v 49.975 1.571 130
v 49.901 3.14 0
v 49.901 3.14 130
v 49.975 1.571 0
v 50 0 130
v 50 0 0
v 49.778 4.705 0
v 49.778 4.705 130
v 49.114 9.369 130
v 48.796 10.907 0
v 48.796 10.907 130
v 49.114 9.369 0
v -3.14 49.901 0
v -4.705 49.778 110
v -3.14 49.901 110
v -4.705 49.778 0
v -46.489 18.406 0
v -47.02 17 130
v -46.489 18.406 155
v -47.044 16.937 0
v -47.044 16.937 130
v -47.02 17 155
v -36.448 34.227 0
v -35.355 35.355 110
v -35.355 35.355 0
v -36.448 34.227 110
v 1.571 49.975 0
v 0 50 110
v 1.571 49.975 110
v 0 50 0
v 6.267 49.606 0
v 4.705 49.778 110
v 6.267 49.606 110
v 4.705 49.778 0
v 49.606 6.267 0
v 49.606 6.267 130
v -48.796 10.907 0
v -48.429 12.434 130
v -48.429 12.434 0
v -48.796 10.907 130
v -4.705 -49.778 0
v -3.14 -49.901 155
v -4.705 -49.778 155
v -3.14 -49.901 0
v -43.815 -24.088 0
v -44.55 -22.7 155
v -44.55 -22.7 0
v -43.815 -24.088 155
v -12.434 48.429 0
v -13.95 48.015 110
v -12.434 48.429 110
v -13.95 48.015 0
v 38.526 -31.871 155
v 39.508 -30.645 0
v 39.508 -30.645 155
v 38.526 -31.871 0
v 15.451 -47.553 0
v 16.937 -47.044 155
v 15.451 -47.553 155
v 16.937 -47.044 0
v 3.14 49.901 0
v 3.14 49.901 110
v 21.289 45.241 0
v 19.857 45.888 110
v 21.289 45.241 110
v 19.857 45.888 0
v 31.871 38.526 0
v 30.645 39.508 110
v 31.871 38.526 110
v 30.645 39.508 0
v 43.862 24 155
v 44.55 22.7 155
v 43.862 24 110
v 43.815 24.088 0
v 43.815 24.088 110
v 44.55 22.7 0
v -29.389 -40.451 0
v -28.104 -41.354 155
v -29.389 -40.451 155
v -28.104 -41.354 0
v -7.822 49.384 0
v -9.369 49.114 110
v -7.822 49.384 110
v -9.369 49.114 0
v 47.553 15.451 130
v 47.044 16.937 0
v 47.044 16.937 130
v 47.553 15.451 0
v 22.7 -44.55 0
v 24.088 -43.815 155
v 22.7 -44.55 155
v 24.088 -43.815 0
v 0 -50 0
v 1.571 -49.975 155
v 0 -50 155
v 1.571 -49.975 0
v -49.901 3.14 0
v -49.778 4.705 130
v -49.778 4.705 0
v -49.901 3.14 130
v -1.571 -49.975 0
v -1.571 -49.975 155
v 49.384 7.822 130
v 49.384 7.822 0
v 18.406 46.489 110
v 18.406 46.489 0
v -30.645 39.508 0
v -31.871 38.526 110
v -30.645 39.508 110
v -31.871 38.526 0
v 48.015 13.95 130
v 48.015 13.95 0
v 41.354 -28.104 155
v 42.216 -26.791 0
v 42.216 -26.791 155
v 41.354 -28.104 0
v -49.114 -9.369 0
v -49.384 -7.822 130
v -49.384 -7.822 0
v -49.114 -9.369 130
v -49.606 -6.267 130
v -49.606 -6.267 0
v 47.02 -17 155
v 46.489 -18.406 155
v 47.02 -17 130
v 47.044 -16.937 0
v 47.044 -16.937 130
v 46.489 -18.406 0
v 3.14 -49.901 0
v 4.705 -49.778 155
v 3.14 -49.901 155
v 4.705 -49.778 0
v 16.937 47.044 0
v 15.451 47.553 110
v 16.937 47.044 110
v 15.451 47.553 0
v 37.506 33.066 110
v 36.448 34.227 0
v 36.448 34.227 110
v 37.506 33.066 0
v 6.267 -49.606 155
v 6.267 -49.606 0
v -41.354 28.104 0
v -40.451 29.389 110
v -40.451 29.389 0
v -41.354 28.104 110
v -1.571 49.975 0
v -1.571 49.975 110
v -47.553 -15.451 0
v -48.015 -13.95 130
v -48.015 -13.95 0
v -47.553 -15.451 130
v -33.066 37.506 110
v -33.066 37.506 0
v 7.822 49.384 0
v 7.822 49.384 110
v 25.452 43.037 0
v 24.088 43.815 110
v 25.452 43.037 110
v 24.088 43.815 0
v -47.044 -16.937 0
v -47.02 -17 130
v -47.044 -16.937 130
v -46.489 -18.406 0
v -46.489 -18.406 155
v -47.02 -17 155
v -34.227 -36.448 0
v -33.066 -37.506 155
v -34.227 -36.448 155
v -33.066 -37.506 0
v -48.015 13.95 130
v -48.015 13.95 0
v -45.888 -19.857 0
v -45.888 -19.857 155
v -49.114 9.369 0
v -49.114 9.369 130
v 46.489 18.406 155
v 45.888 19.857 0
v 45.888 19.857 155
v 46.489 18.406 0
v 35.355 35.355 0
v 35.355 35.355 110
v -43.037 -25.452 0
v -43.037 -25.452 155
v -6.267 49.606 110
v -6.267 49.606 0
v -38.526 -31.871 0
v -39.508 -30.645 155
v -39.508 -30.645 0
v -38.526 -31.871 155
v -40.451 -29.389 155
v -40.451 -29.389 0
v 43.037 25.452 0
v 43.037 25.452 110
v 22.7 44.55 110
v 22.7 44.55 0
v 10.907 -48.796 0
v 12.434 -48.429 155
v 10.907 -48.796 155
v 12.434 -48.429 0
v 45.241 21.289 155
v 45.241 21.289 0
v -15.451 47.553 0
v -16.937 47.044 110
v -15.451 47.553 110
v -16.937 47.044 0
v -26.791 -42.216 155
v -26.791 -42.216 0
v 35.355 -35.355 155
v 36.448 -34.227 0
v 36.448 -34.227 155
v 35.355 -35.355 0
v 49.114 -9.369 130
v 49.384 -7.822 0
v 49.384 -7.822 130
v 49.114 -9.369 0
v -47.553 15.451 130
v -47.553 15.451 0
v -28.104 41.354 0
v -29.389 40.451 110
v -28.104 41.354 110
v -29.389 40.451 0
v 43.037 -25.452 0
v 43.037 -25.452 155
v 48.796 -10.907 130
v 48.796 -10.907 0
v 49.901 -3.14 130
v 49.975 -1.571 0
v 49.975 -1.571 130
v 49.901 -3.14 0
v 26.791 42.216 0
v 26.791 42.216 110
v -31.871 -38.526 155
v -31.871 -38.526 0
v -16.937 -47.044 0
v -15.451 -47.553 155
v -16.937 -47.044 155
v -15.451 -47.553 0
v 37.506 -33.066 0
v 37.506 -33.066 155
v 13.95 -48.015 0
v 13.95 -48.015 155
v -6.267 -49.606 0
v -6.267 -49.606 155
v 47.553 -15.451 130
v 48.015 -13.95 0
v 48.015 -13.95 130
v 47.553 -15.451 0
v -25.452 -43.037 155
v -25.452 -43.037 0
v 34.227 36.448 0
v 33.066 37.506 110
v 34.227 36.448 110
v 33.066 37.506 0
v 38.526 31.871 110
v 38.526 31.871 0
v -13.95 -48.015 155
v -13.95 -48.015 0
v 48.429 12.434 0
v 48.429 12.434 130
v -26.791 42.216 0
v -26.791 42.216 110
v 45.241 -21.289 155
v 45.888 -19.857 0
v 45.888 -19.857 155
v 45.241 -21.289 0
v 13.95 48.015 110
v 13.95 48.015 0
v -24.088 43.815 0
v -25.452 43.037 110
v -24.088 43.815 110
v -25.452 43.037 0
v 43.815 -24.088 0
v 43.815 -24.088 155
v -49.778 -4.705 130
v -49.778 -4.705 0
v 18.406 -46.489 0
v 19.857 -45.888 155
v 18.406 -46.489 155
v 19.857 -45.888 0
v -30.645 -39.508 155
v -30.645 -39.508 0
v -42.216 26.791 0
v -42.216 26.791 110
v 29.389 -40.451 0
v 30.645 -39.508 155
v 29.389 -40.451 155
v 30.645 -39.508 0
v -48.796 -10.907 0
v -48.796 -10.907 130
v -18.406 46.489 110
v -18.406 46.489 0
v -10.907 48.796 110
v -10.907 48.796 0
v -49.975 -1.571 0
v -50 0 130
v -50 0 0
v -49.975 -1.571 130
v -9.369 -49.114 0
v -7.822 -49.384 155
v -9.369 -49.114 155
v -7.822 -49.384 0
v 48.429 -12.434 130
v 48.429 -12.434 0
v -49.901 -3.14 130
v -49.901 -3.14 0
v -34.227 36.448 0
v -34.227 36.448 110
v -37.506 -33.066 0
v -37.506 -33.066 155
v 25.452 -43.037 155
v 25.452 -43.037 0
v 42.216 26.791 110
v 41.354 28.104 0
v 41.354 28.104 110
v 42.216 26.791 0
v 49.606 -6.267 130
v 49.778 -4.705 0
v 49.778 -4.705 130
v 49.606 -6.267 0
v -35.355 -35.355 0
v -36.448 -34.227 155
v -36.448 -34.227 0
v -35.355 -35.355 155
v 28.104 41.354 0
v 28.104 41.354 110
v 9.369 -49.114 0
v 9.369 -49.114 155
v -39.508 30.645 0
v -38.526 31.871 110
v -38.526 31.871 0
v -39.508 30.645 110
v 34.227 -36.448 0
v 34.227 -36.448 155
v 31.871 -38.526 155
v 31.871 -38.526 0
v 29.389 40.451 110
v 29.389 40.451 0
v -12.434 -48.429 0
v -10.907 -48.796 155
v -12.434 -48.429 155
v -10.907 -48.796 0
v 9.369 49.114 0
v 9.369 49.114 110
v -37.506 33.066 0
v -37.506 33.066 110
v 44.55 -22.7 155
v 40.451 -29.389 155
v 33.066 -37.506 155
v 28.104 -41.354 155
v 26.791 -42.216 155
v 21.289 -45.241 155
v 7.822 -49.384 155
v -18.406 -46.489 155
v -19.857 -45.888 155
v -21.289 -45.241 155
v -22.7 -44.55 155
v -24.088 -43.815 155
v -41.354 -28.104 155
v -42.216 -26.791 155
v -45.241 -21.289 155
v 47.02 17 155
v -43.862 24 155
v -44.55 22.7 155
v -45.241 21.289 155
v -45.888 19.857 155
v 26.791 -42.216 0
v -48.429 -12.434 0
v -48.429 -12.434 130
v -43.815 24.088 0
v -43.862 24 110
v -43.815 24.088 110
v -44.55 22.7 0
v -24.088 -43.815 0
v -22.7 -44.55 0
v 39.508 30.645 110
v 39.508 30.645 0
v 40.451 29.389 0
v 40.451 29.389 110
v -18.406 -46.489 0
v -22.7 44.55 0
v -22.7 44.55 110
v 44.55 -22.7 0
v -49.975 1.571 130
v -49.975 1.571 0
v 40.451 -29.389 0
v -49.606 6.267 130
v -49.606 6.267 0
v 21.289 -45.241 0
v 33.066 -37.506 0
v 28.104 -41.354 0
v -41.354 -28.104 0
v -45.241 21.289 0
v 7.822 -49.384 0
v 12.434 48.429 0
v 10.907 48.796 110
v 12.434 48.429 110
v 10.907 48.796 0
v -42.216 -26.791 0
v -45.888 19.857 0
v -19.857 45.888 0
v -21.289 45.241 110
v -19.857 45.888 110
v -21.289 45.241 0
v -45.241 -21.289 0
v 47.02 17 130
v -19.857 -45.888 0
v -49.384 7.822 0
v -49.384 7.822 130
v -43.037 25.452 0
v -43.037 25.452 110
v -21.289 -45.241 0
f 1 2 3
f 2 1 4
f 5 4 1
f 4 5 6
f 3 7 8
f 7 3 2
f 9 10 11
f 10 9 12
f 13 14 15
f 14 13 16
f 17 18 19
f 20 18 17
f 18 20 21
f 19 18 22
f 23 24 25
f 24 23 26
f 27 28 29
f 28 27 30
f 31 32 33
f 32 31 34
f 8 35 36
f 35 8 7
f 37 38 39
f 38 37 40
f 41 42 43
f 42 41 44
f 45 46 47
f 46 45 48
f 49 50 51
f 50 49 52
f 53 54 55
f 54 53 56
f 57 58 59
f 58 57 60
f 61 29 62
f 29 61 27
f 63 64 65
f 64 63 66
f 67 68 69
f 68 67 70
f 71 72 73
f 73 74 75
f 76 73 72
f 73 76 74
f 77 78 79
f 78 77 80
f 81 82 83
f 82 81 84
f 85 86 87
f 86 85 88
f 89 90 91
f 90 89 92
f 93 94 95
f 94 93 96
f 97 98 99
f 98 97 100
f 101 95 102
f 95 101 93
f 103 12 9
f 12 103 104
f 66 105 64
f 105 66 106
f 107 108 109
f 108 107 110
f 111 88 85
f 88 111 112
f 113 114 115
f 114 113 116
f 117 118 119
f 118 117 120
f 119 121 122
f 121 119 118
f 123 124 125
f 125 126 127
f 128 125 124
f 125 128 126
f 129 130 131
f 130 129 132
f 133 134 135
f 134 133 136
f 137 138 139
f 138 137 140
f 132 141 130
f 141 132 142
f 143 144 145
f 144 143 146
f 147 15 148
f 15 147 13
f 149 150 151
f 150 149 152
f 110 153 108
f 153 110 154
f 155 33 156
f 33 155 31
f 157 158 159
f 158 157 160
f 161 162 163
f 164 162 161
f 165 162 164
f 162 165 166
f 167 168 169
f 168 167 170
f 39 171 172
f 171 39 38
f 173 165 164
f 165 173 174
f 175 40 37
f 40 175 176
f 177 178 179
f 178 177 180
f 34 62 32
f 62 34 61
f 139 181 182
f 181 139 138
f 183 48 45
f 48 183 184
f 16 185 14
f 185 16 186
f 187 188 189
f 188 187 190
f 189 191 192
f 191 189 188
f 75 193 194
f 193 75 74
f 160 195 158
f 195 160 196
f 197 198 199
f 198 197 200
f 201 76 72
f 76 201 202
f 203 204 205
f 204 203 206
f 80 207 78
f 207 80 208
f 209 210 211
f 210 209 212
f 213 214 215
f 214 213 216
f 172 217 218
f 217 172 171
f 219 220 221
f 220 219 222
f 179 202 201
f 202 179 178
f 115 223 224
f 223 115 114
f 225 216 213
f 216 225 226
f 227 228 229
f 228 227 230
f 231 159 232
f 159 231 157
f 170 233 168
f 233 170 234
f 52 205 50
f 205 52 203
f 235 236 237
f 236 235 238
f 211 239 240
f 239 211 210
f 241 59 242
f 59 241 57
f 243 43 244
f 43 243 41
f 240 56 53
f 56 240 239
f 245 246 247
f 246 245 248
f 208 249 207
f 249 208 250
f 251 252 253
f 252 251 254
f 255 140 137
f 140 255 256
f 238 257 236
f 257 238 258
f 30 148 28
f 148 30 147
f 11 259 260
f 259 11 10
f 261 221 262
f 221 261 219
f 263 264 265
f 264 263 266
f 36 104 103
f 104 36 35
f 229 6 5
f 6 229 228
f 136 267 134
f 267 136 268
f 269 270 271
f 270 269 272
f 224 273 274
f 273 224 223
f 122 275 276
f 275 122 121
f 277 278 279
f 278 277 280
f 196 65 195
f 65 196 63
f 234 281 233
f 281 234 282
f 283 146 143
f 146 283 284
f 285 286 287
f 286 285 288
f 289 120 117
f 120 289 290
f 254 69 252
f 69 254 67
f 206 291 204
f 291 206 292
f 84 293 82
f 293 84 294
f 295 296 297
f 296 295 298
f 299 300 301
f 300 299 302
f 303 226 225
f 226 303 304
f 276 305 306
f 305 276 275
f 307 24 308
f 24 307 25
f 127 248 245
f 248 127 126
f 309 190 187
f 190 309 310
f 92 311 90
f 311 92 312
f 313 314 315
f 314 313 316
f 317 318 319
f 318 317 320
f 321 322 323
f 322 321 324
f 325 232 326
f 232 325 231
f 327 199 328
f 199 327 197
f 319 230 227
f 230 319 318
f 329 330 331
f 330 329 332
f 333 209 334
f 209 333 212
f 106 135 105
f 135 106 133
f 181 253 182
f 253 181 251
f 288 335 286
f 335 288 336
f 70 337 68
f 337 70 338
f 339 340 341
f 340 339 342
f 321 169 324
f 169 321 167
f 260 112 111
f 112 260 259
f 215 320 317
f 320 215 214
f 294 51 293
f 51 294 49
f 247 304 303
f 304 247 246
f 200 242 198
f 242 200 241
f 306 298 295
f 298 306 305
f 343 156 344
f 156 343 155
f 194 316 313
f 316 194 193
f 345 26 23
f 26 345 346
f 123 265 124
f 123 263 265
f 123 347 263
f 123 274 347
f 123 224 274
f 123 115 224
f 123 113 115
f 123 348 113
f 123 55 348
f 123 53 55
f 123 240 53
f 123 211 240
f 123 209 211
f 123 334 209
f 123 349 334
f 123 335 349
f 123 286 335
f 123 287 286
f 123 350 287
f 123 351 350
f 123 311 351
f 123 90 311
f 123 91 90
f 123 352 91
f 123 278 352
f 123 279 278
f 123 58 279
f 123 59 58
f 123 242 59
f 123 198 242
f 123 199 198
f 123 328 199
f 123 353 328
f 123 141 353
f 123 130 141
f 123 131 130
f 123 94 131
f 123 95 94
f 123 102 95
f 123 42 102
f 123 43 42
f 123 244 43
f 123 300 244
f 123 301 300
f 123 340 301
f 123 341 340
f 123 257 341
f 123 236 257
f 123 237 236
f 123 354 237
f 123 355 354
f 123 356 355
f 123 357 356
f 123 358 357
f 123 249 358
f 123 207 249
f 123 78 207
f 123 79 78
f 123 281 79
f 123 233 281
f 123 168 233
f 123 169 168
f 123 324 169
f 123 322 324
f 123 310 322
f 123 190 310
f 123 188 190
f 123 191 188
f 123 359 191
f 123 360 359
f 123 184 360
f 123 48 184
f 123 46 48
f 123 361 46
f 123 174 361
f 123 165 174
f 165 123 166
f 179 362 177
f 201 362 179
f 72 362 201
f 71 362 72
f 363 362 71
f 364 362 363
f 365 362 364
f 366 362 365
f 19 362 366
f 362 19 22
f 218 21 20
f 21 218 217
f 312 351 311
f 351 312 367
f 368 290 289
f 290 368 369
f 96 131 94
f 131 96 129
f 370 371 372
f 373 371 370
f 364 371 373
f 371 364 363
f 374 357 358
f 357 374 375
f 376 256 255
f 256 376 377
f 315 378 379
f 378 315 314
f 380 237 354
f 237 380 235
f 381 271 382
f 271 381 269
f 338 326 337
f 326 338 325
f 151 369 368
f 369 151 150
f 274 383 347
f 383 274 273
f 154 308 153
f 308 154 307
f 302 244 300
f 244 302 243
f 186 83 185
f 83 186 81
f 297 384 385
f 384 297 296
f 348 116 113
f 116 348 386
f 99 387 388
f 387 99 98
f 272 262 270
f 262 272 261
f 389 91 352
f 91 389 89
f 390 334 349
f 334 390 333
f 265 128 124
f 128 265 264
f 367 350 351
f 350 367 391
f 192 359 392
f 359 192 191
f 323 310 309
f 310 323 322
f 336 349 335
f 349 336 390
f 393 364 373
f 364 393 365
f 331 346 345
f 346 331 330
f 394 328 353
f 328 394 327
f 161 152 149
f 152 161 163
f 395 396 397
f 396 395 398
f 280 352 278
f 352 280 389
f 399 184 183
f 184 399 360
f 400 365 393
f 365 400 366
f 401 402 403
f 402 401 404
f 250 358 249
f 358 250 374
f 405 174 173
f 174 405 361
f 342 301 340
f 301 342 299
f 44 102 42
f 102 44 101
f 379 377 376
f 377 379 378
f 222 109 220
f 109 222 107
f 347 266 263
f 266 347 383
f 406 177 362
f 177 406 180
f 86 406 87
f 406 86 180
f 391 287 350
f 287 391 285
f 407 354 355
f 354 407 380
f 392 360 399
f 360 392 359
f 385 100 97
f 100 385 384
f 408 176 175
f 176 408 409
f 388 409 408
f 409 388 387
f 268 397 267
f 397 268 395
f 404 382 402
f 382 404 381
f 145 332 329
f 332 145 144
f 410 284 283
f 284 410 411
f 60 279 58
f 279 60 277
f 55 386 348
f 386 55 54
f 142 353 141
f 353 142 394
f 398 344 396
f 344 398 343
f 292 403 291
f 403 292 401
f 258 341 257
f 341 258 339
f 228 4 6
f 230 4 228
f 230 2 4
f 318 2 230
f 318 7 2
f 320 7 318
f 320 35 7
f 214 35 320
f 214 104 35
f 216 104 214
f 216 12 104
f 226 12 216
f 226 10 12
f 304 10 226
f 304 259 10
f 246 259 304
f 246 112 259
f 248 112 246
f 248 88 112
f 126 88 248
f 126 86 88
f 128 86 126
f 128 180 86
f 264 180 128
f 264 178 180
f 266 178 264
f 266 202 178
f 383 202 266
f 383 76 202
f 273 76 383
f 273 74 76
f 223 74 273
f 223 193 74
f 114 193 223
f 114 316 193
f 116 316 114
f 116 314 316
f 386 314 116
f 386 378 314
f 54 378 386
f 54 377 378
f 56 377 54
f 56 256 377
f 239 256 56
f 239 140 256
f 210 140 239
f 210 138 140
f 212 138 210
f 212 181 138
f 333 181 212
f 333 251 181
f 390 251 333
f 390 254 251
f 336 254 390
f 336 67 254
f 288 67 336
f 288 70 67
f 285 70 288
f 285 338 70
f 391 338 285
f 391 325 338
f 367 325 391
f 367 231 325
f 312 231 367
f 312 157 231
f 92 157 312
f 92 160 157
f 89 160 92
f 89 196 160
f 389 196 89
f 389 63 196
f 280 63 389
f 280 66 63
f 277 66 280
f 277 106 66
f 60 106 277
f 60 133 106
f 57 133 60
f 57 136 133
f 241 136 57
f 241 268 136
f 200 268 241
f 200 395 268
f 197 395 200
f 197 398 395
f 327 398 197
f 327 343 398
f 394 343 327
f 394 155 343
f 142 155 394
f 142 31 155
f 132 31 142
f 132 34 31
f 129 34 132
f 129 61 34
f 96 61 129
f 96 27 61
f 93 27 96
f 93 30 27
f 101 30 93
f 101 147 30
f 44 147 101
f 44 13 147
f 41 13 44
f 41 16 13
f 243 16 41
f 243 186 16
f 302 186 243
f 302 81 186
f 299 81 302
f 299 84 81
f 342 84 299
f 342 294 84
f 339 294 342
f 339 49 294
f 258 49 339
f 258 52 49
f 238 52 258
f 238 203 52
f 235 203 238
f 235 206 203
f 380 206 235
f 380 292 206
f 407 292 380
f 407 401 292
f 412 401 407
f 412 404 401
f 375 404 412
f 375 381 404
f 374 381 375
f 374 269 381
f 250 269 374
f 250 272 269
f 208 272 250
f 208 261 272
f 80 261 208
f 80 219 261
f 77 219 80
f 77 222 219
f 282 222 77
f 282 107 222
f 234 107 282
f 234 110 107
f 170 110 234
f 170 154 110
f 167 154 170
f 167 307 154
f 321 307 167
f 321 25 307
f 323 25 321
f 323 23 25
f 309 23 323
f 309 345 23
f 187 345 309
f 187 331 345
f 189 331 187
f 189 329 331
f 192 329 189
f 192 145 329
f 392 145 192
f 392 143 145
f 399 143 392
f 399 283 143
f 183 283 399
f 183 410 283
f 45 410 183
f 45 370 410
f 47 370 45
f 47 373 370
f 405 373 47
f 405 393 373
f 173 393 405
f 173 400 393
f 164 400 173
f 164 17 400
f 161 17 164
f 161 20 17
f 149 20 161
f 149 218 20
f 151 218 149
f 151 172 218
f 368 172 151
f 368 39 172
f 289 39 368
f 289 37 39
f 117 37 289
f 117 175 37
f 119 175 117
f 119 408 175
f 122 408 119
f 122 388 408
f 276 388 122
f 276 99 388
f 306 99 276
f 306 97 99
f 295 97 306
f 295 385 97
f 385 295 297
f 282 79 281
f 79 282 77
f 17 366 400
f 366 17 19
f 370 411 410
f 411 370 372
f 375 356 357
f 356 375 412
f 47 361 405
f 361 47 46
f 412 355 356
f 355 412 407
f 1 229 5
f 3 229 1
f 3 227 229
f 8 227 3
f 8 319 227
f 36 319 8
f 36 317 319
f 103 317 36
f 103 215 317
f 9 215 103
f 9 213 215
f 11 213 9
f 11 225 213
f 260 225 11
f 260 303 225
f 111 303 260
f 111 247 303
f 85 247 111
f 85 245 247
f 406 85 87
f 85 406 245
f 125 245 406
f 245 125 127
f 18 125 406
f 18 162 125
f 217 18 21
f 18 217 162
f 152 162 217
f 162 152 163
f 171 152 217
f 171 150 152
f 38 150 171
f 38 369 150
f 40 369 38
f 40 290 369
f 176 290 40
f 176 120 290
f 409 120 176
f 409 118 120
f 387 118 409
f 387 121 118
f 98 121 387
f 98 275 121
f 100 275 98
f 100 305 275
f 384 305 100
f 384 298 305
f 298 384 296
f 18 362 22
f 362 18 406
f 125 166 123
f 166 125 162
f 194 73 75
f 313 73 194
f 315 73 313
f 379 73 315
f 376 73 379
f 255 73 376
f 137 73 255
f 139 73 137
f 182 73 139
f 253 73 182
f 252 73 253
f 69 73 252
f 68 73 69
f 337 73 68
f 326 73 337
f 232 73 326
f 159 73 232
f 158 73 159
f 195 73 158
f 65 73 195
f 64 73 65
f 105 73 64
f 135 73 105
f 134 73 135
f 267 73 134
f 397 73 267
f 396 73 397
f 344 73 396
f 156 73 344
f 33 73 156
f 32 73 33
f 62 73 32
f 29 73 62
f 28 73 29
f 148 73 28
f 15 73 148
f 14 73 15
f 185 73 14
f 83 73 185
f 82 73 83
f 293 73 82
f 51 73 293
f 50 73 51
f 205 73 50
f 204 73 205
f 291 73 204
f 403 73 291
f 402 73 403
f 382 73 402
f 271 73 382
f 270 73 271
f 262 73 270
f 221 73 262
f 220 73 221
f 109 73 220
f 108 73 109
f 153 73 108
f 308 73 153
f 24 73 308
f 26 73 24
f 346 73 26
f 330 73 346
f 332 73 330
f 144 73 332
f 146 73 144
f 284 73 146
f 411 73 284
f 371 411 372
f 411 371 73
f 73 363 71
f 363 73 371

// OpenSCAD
level=38;
level_h=8;
total_h=130;
wall=5;
walll=wall*2;
pad=0.1;
padd=pad*2;
$fn=200;

base=100;
base_h=total_h-20;

ridge=34;
ridge_h=25;

slot=7;
slot_h=20;

module front() {
    difference() {
        union() {
            cylinder(d=level+walll,h=total_h+level_h);
            //cylinder(d2=level+walll,d1=base,h=base_h);
            cylinder(d=base,h=base_h);
        }

        translate([0,0,level_h+total_h-level_h+pad])
        cylinder(d=level, h=level_h+pad, $fn=6);
    }
}
    //translate([0,0,total_h-level_h+pad])
    //#cylinder(d=level, h=level_h+pad);


difference() {
    cylinder(d=base,h=total_h+ridge_h);
    translate([-base/2-pad,-ridge/2,total_h])
    cube([base+padd,ridge,ridge_h+pad]);

    translate([-base/2-pad,ridge/2+slot,total_h-slot_h])
    cube([base+padd,base/2,ridge_h+slot_h+pad]);
}
